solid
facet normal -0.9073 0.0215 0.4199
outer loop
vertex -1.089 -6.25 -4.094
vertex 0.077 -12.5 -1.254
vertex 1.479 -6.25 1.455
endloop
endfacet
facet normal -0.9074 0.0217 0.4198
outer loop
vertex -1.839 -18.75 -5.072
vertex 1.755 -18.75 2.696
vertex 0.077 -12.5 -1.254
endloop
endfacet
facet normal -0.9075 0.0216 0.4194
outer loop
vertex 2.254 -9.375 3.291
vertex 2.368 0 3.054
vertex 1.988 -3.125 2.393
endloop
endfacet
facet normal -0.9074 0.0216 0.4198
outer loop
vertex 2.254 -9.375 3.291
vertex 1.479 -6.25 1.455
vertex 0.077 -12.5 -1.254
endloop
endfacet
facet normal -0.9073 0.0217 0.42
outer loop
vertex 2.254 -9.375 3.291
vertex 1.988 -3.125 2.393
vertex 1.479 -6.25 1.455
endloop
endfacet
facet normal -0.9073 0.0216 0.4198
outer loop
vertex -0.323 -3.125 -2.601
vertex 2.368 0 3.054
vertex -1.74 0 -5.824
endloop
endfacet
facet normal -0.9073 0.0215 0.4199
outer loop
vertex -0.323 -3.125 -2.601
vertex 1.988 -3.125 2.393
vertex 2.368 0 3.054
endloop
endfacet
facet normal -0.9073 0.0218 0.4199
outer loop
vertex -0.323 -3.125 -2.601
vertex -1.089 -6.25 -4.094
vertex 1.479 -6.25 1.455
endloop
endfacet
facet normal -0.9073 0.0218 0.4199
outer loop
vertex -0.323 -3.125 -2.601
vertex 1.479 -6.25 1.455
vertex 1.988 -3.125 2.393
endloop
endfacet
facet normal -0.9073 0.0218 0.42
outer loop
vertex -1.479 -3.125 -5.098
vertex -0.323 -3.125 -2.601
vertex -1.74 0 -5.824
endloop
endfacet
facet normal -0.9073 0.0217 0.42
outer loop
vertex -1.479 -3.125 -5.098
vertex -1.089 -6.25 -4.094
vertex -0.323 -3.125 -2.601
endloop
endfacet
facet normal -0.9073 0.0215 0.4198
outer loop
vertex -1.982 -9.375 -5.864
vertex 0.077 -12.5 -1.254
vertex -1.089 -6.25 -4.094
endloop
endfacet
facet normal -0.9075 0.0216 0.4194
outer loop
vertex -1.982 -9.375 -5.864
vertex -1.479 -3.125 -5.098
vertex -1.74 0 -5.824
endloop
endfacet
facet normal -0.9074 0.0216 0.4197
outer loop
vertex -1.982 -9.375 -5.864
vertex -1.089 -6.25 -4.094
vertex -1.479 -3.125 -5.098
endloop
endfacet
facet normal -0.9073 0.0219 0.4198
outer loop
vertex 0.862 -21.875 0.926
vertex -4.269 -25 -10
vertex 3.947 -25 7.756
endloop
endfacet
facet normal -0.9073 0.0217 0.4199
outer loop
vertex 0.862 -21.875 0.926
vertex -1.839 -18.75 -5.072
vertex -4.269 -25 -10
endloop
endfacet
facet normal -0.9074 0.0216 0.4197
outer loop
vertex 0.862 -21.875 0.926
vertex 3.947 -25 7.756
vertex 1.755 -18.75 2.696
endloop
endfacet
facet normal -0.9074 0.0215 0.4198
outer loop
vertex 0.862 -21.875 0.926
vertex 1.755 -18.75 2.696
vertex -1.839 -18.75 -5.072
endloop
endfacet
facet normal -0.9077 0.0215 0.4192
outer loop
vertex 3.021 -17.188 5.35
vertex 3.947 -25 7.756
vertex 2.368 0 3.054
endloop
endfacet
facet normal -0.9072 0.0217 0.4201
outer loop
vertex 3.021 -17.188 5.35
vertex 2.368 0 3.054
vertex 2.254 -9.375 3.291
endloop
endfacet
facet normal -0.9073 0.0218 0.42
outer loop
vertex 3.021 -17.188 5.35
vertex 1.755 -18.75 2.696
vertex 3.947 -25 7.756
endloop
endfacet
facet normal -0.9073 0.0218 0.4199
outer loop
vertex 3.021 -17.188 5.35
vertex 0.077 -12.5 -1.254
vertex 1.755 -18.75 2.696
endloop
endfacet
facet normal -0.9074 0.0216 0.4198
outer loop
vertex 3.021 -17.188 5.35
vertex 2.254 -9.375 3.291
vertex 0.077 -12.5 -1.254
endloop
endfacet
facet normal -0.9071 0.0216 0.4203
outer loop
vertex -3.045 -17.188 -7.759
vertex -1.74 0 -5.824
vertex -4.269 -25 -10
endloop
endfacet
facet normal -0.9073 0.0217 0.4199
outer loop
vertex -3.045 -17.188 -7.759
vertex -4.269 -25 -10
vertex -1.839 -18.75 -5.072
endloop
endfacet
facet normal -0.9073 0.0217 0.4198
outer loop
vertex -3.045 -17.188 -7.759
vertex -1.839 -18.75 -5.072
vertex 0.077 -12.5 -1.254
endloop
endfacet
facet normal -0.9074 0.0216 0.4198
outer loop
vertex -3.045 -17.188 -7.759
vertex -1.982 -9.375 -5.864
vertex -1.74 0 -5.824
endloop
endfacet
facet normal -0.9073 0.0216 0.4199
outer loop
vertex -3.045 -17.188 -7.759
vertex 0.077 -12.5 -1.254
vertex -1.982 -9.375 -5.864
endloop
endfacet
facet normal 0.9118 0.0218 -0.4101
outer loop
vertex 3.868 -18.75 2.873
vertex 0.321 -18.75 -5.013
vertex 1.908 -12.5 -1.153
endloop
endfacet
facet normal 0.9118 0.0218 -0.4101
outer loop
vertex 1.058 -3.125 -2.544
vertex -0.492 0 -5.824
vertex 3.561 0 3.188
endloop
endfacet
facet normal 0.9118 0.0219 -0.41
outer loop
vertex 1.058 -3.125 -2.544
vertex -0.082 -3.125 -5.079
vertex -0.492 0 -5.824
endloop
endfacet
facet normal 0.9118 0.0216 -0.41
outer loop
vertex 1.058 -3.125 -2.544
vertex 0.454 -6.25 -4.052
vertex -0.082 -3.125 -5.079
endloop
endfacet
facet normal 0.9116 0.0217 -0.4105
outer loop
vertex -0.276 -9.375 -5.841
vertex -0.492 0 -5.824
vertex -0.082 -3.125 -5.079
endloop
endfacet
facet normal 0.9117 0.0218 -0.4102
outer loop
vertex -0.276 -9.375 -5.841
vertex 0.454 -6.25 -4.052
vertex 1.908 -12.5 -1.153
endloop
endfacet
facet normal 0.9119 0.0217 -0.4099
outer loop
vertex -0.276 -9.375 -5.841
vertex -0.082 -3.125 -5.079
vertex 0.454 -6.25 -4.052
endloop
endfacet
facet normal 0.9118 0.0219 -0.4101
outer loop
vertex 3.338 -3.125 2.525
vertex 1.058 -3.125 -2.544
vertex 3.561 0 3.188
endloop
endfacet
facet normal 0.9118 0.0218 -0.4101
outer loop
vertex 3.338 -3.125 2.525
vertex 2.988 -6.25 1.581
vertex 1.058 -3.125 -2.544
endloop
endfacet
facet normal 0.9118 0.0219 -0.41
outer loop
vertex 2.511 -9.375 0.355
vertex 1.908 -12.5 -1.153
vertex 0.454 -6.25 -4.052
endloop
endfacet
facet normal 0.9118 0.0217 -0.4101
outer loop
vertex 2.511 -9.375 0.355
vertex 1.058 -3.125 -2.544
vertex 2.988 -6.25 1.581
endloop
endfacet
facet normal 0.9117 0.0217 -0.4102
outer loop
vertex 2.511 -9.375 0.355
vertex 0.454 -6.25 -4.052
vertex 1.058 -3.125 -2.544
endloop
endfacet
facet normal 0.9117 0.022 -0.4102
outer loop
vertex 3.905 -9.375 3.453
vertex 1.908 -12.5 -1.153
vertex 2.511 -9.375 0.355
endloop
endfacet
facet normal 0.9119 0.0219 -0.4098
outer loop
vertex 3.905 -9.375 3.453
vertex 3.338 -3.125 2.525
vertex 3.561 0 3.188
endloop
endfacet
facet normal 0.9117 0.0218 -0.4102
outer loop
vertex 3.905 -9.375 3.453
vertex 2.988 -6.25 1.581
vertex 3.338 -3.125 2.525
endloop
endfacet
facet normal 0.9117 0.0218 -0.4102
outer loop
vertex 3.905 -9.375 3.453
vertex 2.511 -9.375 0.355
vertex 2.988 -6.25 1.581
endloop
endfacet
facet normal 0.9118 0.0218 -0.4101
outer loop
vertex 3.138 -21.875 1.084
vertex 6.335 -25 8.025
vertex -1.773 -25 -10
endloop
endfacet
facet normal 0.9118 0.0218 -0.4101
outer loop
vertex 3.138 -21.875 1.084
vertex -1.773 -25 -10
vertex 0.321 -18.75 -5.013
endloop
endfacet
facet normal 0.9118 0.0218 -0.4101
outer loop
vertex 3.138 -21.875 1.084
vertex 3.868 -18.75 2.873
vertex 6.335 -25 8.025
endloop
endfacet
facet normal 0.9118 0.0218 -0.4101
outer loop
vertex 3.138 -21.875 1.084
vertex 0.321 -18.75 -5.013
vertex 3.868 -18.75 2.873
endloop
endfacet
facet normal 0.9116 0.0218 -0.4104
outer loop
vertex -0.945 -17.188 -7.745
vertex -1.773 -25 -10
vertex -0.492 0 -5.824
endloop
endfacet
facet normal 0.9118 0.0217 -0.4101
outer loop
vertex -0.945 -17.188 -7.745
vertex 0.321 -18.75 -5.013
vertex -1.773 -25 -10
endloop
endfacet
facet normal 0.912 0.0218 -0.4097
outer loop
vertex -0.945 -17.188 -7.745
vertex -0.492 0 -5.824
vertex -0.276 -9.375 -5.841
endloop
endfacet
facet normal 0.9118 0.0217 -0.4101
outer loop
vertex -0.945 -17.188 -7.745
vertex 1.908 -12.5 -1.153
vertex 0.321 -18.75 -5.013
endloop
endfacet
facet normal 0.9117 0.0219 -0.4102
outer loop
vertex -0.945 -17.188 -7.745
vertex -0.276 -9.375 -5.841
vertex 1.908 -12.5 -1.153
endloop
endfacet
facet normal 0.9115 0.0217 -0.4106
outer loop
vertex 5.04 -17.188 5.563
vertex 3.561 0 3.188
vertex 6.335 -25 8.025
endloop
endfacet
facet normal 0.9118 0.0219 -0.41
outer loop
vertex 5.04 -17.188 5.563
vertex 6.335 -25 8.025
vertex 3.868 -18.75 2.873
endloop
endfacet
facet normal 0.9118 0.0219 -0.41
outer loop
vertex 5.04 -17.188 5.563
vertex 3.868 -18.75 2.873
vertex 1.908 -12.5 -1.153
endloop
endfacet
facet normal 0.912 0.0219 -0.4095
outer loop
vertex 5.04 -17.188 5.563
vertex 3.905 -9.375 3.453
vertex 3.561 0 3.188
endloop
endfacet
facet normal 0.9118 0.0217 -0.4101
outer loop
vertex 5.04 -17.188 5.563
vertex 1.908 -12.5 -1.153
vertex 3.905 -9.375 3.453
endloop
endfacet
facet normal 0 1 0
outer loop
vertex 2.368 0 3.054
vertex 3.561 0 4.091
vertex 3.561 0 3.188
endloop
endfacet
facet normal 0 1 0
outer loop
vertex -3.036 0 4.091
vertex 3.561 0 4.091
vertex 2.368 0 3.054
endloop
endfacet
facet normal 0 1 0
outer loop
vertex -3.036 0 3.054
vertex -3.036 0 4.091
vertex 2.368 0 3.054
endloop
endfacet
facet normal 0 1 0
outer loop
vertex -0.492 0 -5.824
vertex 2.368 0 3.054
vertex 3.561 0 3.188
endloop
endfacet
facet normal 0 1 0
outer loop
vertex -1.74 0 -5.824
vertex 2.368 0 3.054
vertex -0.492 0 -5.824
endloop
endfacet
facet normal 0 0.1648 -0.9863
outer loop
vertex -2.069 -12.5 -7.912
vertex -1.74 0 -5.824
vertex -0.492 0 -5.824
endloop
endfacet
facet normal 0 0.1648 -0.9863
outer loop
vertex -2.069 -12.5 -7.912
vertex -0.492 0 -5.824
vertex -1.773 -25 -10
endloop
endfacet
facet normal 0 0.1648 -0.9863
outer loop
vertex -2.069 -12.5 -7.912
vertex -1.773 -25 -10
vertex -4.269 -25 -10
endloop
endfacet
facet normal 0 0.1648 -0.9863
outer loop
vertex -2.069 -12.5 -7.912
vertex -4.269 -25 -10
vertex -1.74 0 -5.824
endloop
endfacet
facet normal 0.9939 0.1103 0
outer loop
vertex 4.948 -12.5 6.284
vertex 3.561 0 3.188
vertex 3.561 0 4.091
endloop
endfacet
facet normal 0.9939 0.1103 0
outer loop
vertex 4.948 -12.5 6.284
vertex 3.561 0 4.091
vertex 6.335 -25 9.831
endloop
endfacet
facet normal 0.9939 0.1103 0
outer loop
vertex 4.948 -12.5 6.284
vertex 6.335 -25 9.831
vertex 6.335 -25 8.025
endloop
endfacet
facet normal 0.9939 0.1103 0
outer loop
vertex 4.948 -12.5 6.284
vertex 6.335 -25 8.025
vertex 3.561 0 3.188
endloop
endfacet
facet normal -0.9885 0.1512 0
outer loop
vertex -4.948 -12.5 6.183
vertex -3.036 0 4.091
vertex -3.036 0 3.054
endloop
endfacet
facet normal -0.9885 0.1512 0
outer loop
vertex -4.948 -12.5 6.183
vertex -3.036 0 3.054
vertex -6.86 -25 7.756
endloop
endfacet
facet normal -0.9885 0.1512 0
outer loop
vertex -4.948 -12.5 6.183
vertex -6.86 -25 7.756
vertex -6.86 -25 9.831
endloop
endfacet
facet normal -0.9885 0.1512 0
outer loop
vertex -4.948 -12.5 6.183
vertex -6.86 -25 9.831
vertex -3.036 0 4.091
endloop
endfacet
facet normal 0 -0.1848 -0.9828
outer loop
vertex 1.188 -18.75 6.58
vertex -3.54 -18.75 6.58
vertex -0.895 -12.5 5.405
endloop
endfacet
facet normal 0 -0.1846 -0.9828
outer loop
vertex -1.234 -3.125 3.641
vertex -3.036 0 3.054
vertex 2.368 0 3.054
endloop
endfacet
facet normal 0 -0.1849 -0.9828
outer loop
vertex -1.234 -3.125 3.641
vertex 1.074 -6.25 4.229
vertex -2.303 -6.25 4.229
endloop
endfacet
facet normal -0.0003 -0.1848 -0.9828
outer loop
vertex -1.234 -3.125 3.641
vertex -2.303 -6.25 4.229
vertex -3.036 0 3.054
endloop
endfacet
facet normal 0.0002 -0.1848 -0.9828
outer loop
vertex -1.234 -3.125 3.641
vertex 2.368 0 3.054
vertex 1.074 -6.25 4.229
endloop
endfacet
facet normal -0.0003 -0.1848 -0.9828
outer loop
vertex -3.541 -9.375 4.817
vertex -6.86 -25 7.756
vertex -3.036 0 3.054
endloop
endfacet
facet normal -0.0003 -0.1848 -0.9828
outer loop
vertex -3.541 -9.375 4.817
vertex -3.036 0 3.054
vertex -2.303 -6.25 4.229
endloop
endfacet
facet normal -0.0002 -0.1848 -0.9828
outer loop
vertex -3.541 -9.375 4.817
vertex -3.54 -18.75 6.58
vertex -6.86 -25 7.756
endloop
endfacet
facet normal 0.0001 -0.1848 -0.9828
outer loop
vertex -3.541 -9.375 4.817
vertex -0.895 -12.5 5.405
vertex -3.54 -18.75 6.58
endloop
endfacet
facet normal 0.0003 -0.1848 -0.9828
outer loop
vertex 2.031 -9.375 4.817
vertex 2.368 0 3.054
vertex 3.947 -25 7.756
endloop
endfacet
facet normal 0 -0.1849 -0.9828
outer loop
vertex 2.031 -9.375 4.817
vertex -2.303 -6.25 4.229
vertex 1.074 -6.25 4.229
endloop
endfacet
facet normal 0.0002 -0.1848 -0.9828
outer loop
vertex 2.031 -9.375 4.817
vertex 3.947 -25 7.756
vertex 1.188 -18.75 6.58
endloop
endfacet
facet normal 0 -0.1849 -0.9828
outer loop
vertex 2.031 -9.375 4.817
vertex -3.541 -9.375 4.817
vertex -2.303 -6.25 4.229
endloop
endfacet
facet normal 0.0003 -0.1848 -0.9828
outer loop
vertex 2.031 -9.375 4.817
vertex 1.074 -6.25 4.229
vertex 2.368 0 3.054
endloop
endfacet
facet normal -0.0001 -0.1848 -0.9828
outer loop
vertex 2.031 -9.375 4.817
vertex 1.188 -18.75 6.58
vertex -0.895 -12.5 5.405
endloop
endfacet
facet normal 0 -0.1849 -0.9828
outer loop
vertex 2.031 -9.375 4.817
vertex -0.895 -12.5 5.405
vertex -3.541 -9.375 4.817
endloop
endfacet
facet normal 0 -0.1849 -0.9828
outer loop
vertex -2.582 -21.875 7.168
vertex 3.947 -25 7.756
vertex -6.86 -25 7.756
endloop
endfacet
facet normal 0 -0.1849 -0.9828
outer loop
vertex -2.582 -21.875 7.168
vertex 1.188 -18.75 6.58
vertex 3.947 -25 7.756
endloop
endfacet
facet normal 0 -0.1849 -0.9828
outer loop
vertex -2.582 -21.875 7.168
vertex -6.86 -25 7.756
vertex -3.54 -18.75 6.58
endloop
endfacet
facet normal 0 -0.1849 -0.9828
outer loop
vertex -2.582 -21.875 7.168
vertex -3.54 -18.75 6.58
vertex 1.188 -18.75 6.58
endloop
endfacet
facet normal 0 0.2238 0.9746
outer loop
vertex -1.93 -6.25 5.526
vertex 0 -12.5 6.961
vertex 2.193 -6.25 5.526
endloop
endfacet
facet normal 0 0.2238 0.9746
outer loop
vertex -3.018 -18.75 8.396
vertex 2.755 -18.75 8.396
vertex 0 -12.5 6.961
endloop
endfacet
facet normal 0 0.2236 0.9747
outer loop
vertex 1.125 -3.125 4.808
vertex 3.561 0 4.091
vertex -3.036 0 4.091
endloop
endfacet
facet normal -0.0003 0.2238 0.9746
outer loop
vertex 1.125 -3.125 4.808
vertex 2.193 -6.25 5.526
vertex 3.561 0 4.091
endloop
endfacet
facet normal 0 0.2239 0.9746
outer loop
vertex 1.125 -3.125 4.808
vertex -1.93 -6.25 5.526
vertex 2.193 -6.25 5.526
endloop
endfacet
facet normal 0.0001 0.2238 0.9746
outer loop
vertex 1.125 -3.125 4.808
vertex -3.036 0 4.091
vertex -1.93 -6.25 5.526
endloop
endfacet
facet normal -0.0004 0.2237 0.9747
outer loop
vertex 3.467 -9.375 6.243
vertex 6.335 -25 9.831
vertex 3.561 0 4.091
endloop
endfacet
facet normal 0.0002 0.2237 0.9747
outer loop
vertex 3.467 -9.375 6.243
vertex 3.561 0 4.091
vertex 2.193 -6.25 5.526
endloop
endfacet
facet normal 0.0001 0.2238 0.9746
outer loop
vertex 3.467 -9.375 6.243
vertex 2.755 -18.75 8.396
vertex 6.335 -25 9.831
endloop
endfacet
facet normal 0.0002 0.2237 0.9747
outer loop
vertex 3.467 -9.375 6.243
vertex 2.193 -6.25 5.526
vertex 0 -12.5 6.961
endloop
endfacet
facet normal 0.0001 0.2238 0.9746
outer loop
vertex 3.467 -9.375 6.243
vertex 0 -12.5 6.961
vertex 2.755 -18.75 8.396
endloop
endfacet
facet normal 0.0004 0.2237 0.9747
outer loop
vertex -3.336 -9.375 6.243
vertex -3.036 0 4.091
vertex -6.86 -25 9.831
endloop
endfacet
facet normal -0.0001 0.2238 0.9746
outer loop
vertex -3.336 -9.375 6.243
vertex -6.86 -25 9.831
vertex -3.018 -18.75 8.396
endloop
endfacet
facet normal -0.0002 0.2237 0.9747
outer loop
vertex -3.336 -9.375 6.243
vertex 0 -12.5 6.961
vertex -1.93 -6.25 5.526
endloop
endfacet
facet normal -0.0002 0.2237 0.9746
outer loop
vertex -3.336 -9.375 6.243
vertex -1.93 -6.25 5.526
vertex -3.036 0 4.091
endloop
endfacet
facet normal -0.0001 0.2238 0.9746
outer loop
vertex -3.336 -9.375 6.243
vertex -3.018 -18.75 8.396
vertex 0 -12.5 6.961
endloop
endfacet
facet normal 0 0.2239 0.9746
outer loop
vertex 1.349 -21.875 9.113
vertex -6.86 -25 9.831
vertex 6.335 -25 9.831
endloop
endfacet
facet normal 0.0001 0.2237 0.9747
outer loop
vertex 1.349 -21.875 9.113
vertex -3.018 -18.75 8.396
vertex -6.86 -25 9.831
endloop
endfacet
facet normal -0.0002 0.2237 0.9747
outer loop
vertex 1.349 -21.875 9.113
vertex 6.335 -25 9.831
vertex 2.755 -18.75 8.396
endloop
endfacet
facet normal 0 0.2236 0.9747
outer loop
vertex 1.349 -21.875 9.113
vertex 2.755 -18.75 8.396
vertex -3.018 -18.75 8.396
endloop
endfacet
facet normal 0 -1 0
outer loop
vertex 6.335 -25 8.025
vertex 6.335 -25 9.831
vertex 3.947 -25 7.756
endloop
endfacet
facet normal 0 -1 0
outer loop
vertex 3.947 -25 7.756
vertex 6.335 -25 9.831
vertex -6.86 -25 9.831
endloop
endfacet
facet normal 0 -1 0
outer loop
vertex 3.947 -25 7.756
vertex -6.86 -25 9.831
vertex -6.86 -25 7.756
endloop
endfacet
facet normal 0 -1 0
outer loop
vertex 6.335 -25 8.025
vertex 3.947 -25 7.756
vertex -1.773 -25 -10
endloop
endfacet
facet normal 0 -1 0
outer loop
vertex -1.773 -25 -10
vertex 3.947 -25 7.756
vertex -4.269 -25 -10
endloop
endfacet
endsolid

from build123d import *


with BuildPart() as f3:
    # F0 (on Front) → F3 section 0
    with BuildSketch(Plane.XZ):
        Polygon((2.3678315957, 3.0536655475), (-1.7402413209, -5.8243726469), (-0.4924114598, -5.8243726469), (3.5614079846, 3.1882141586), (3.5614079846, 4.0909919364), (-3.0358142376, 4.0909919364), (-3.0358142376, 3.0536655475), align=None)
    # F2 (on offset) → F3 section 1
    with BuildSketch(Plane.XZ.offset(25)):
        Polygon((-4.2686631944, -10), (-1.7730034722, -10), (6.3346354167, 8.0251736111), (6.3346354167, 9.8307291667), (-6.8598090278, 9.8307291667), (-6.8598090278, 7.7560763889), (3.9474826389, 7.7560763889), align=None)
    loft()


solid = f3.part
